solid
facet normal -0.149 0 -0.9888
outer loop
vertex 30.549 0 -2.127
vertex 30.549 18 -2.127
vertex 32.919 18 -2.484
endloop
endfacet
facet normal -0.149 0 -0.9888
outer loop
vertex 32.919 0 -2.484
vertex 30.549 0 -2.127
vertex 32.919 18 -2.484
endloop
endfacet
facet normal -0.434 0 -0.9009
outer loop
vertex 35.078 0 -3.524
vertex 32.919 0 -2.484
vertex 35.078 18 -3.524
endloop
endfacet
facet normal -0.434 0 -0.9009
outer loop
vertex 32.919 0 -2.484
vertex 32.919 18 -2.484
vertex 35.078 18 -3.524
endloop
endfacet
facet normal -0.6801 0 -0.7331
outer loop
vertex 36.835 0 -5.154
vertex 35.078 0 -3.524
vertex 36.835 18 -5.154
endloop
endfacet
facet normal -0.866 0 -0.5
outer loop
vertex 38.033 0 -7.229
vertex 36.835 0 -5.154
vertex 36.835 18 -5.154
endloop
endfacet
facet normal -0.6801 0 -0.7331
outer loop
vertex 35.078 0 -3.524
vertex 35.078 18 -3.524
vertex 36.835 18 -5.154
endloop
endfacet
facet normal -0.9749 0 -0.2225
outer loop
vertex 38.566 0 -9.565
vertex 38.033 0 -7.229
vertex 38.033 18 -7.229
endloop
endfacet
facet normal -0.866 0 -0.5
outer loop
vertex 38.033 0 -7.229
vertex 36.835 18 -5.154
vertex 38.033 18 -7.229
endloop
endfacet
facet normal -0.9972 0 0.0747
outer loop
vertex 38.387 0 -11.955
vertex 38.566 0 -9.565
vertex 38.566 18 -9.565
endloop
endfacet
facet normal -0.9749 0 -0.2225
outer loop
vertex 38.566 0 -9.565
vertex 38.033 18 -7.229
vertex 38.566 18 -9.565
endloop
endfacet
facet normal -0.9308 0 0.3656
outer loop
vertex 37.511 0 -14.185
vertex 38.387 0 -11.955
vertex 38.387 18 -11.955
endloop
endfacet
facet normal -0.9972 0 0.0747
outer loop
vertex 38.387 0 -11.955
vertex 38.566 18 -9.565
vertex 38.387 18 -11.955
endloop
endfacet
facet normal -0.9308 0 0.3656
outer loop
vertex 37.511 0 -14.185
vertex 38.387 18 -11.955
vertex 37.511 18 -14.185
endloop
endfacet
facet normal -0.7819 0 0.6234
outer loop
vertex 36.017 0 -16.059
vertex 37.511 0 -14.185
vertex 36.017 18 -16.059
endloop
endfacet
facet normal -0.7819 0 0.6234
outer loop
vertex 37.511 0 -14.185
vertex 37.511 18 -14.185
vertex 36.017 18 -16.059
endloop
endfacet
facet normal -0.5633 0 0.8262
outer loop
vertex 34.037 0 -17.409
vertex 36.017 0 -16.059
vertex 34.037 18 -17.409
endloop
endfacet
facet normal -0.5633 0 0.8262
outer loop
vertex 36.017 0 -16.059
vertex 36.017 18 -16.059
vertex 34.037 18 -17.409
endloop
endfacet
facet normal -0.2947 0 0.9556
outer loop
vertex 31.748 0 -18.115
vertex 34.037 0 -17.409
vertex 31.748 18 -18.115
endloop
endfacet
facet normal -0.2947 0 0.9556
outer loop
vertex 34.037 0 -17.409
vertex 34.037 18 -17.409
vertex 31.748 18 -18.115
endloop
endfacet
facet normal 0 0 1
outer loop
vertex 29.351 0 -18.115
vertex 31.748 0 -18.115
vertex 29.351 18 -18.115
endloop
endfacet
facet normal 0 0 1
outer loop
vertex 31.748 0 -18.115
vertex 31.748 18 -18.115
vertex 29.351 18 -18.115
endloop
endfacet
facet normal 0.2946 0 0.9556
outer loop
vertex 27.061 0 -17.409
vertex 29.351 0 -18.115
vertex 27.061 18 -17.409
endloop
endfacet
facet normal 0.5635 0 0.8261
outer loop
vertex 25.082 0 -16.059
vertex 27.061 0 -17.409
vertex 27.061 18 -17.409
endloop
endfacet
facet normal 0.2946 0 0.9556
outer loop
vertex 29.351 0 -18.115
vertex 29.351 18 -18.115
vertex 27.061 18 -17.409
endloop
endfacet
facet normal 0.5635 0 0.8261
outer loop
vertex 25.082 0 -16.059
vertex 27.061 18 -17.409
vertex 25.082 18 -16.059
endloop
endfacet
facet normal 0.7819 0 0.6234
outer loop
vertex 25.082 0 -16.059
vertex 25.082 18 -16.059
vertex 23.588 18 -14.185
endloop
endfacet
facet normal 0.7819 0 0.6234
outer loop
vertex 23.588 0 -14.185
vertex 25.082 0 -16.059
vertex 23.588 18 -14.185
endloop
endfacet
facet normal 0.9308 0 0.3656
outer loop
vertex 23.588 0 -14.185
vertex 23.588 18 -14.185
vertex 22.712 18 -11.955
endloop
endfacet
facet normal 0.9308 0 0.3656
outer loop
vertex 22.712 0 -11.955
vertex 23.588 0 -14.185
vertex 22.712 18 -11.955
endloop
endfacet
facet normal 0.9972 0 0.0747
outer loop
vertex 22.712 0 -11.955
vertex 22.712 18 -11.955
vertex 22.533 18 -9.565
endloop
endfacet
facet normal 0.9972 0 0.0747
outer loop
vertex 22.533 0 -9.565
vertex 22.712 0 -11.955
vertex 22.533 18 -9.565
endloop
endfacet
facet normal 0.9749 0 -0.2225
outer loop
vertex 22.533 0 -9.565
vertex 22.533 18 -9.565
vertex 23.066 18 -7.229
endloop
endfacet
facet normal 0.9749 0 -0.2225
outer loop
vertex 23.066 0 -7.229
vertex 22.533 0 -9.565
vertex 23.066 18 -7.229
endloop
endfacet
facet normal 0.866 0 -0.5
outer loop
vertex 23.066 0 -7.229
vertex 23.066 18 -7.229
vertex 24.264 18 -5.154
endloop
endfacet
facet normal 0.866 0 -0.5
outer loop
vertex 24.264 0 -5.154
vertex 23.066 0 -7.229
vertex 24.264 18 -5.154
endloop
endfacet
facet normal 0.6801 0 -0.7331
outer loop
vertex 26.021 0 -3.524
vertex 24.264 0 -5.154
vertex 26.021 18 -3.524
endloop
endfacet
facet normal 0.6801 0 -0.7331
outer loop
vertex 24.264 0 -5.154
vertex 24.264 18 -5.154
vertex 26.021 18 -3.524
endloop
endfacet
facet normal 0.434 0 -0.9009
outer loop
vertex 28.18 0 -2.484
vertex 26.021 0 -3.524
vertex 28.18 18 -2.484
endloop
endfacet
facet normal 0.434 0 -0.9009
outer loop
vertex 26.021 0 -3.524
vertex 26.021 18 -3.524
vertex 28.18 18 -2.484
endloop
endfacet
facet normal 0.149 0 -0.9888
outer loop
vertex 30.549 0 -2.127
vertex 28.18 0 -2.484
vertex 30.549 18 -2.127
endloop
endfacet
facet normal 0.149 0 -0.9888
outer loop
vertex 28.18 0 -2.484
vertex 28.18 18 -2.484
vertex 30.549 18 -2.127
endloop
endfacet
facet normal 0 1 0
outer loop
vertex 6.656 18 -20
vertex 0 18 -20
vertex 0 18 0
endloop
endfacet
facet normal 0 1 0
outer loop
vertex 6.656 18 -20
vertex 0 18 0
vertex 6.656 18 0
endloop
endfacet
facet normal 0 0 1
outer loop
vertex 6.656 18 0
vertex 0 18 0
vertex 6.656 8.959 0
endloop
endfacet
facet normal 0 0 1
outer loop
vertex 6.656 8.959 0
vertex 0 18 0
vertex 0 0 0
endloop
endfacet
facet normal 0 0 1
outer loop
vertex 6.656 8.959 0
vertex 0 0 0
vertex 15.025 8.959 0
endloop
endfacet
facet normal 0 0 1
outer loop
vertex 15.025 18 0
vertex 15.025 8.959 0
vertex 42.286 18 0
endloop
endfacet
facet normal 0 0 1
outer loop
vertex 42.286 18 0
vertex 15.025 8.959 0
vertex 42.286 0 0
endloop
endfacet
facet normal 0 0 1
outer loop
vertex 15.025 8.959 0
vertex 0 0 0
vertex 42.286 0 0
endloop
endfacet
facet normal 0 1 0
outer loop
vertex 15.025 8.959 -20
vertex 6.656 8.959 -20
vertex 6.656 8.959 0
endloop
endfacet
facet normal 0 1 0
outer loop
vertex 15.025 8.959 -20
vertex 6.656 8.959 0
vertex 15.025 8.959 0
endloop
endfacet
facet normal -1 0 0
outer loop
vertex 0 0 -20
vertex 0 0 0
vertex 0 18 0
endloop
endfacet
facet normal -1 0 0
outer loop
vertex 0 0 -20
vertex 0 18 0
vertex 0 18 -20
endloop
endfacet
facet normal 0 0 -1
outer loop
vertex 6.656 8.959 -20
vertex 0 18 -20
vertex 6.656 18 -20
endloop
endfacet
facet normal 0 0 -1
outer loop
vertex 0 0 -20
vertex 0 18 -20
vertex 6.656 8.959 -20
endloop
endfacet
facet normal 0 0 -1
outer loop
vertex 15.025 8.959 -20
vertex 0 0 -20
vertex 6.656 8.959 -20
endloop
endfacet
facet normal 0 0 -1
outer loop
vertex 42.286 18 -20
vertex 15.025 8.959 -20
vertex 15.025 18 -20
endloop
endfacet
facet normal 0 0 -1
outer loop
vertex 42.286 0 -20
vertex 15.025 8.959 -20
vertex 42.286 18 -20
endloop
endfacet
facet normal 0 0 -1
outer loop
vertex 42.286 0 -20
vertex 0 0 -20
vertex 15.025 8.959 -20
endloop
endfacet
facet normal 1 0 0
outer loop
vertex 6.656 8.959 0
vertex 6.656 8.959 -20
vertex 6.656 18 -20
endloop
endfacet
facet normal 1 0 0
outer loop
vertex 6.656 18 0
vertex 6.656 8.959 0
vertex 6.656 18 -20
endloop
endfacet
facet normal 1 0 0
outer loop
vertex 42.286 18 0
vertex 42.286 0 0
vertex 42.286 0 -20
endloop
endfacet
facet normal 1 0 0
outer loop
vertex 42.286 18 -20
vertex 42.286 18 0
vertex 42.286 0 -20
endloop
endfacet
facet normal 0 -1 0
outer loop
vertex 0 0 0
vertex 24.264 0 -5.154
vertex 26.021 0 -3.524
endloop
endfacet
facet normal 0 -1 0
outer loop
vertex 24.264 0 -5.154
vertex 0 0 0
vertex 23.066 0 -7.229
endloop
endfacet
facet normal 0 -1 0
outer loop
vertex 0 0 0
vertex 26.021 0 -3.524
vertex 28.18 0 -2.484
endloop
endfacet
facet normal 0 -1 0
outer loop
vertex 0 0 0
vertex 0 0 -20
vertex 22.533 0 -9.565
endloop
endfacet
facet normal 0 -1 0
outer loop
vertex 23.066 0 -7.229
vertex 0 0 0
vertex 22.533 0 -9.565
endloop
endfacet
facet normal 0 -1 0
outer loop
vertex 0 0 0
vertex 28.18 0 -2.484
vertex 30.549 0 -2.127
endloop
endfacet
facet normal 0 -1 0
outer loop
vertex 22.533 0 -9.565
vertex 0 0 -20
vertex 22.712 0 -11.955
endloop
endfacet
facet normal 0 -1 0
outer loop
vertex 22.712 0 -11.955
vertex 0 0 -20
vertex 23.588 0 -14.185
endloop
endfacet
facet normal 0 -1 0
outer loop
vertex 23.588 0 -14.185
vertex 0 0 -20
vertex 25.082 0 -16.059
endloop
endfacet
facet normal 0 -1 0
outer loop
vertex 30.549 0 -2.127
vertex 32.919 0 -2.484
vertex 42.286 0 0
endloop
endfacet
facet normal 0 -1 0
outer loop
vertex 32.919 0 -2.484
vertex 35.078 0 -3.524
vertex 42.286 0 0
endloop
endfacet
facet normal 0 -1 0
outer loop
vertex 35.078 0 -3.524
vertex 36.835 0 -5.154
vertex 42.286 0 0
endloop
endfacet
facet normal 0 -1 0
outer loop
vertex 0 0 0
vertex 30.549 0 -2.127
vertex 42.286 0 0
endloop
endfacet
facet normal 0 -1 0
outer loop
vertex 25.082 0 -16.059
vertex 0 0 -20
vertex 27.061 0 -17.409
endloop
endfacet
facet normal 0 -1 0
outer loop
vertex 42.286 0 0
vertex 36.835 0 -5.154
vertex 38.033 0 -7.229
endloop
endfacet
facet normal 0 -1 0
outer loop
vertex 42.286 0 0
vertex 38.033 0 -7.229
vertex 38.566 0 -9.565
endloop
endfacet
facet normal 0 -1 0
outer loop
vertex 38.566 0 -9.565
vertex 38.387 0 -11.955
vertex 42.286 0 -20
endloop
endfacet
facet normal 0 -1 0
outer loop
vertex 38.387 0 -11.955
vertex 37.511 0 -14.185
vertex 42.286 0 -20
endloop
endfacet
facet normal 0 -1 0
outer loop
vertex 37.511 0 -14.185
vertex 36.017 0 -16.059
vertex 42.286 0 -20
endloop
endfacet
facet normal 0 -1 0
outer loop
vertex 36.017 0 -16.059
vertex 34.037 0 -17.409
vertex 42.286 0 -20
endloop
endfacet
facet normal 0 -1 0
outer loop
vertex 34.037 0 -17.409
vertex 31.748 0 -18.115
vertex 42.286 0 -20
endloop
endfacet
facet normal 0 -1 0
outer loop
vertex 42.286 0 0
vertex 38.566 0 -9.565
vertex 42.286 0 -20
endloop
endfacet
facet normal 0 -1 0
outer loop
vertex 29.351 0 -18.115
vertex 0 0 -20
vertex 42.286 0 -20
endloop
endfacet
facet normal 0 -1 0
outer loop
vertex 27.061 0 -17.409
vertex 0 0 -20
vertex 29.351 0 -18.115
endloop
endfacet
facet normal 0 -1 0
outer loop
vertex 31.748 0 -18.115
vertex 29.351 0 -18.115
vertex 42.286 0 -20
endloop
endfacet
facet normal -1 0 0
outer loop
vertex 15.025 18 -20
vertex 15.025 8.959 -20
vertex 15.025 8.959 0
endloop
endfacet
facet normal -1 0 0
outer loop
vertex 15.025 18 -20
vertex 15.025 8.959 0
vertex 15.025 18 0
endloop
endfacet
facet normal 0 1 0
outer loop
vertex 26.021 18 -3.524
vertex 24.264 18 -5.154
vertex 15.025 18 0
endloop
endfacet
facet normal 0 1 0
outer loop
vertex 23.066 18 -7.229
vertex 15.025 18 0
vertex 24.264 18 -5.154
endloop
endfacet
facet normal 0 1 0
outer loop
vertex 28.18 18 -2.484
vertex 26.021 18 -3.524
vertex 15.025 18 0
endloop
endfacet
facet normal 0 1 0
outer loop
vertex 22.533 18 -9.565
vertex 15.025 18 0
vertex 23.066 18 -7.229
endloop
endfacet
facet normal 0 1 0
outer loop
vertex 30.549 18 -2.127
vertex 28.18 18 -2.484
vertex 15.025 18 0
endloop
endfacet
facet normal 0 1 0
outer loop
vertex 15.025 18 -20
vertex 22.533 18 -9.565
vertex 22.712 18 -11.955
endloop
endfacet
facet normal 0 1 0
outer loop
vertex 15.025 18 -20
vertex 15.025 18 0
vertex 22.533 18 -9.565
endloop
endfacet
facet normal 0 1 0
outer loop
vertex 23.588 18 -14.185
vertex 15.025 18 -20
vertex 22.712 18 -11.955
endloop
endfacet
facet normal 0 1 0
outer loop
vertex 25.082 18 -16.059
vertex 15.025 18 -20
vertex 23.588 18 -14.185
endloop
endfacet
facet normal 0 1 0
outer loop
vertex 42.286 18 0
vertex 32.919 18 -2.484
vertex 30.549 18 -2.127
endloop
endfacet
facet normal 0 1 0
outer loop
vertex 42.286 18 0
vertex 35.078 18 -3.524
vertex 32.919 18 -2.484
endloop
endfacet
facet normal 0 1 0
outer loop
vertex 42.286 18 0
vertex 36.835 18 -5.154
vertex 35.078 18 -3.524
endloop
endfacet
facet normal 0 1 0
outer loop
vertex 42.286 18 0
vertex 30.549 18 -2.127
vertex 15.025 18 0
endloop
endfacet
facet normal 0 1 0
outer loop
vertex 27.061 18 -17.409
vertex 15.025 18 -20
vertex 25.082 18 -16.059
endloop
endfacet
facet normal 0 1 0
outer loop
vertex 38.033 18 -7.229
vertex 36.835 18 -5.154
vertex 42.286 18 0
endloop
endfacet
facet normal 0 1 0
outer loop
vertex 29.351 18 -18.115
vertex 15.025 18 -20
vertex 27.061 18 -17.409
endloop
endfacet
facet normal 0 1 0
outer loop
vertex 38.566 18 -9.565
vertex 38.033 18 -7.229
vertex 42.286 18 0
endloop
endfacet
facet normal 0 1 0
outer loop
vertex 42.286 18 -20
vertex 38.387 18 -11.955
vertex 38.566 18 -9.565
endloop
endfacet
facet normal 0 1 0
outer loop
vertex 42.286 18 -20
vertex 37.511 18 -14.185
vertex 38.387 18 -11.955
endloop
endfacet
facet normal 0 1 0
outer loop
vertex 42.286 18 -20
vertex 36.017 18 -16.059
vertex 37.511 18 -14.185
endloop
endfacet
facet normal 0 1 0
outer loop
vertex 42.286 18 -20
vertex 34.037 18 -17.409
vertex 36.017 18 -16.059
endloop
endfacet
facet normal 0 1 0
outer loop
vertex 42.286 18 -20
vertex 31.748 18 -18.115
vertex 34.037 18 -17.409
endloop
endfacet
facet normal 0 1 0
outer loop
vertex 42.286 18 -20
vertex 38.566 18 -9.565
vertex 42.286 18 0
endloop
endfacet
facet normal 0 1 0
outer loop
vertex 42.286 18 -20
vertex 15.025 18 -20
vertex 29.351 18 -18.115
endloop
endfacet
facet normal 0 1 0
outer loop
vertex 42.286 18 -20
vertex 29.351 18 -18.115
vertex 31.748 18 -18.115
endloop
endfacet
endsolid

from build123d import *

# Parameters (mm, degrees)
SKETCH1_W           = 42.285714286
SKETCH1_H           = 20
BOSS_EXTRUDE1_DEPTH = 18
SKETCH2_R           = 8.03891696
CUT_EXTRUDE1_DEPTH  = 18
SKETCH4_W           = 8.368646061
SKETCH4_H           = 9.041107824
CUT_EXTRUDE2_DEPTH  = 20


with BuildPart() as part:
    # Sketch1 → Boss-Extrude1 (new body)
    with BuildSketch(Plane(origin=(0, 0, 0), x_dir=(1, 0, 0), z_dir=(0, 1, 0))):
        with Locations((21.142857143, 10)):
            Rectangle(SKETCH1_W, SKETCH1_H)
    extrude(amount=BOSS_EXTRUDE1_DEPTH)

    # Sketch2 → Cut-Extrude1 (cut)
    with BuildSketch(Plane(origin=(0, 18, 0), x_dir=(1, 0, 0), z_dir=(0, 1, 0))):
        with Locations(Location((30.549434958, 10.165764801, 0), (0, 0, 270))):
            Circle(SKETCH2_R)
    extrude(amount=-CUT_EXTRUDE1_DEPTH, mode=Mode.SUBTRACT)

    # Sketch4 → Cut-Extrude2 (cut)
    with BuildSketch(Plane.XY):
        with Locations((10.8404183, 13.479446088)):
            Rectangle(SKETCH4_W, SKETCH4_H)
    extrude(amount=-CUT_EXTRUDE2_DEPTH, mode=Mode.SUBTRACT)


solid = part.part
